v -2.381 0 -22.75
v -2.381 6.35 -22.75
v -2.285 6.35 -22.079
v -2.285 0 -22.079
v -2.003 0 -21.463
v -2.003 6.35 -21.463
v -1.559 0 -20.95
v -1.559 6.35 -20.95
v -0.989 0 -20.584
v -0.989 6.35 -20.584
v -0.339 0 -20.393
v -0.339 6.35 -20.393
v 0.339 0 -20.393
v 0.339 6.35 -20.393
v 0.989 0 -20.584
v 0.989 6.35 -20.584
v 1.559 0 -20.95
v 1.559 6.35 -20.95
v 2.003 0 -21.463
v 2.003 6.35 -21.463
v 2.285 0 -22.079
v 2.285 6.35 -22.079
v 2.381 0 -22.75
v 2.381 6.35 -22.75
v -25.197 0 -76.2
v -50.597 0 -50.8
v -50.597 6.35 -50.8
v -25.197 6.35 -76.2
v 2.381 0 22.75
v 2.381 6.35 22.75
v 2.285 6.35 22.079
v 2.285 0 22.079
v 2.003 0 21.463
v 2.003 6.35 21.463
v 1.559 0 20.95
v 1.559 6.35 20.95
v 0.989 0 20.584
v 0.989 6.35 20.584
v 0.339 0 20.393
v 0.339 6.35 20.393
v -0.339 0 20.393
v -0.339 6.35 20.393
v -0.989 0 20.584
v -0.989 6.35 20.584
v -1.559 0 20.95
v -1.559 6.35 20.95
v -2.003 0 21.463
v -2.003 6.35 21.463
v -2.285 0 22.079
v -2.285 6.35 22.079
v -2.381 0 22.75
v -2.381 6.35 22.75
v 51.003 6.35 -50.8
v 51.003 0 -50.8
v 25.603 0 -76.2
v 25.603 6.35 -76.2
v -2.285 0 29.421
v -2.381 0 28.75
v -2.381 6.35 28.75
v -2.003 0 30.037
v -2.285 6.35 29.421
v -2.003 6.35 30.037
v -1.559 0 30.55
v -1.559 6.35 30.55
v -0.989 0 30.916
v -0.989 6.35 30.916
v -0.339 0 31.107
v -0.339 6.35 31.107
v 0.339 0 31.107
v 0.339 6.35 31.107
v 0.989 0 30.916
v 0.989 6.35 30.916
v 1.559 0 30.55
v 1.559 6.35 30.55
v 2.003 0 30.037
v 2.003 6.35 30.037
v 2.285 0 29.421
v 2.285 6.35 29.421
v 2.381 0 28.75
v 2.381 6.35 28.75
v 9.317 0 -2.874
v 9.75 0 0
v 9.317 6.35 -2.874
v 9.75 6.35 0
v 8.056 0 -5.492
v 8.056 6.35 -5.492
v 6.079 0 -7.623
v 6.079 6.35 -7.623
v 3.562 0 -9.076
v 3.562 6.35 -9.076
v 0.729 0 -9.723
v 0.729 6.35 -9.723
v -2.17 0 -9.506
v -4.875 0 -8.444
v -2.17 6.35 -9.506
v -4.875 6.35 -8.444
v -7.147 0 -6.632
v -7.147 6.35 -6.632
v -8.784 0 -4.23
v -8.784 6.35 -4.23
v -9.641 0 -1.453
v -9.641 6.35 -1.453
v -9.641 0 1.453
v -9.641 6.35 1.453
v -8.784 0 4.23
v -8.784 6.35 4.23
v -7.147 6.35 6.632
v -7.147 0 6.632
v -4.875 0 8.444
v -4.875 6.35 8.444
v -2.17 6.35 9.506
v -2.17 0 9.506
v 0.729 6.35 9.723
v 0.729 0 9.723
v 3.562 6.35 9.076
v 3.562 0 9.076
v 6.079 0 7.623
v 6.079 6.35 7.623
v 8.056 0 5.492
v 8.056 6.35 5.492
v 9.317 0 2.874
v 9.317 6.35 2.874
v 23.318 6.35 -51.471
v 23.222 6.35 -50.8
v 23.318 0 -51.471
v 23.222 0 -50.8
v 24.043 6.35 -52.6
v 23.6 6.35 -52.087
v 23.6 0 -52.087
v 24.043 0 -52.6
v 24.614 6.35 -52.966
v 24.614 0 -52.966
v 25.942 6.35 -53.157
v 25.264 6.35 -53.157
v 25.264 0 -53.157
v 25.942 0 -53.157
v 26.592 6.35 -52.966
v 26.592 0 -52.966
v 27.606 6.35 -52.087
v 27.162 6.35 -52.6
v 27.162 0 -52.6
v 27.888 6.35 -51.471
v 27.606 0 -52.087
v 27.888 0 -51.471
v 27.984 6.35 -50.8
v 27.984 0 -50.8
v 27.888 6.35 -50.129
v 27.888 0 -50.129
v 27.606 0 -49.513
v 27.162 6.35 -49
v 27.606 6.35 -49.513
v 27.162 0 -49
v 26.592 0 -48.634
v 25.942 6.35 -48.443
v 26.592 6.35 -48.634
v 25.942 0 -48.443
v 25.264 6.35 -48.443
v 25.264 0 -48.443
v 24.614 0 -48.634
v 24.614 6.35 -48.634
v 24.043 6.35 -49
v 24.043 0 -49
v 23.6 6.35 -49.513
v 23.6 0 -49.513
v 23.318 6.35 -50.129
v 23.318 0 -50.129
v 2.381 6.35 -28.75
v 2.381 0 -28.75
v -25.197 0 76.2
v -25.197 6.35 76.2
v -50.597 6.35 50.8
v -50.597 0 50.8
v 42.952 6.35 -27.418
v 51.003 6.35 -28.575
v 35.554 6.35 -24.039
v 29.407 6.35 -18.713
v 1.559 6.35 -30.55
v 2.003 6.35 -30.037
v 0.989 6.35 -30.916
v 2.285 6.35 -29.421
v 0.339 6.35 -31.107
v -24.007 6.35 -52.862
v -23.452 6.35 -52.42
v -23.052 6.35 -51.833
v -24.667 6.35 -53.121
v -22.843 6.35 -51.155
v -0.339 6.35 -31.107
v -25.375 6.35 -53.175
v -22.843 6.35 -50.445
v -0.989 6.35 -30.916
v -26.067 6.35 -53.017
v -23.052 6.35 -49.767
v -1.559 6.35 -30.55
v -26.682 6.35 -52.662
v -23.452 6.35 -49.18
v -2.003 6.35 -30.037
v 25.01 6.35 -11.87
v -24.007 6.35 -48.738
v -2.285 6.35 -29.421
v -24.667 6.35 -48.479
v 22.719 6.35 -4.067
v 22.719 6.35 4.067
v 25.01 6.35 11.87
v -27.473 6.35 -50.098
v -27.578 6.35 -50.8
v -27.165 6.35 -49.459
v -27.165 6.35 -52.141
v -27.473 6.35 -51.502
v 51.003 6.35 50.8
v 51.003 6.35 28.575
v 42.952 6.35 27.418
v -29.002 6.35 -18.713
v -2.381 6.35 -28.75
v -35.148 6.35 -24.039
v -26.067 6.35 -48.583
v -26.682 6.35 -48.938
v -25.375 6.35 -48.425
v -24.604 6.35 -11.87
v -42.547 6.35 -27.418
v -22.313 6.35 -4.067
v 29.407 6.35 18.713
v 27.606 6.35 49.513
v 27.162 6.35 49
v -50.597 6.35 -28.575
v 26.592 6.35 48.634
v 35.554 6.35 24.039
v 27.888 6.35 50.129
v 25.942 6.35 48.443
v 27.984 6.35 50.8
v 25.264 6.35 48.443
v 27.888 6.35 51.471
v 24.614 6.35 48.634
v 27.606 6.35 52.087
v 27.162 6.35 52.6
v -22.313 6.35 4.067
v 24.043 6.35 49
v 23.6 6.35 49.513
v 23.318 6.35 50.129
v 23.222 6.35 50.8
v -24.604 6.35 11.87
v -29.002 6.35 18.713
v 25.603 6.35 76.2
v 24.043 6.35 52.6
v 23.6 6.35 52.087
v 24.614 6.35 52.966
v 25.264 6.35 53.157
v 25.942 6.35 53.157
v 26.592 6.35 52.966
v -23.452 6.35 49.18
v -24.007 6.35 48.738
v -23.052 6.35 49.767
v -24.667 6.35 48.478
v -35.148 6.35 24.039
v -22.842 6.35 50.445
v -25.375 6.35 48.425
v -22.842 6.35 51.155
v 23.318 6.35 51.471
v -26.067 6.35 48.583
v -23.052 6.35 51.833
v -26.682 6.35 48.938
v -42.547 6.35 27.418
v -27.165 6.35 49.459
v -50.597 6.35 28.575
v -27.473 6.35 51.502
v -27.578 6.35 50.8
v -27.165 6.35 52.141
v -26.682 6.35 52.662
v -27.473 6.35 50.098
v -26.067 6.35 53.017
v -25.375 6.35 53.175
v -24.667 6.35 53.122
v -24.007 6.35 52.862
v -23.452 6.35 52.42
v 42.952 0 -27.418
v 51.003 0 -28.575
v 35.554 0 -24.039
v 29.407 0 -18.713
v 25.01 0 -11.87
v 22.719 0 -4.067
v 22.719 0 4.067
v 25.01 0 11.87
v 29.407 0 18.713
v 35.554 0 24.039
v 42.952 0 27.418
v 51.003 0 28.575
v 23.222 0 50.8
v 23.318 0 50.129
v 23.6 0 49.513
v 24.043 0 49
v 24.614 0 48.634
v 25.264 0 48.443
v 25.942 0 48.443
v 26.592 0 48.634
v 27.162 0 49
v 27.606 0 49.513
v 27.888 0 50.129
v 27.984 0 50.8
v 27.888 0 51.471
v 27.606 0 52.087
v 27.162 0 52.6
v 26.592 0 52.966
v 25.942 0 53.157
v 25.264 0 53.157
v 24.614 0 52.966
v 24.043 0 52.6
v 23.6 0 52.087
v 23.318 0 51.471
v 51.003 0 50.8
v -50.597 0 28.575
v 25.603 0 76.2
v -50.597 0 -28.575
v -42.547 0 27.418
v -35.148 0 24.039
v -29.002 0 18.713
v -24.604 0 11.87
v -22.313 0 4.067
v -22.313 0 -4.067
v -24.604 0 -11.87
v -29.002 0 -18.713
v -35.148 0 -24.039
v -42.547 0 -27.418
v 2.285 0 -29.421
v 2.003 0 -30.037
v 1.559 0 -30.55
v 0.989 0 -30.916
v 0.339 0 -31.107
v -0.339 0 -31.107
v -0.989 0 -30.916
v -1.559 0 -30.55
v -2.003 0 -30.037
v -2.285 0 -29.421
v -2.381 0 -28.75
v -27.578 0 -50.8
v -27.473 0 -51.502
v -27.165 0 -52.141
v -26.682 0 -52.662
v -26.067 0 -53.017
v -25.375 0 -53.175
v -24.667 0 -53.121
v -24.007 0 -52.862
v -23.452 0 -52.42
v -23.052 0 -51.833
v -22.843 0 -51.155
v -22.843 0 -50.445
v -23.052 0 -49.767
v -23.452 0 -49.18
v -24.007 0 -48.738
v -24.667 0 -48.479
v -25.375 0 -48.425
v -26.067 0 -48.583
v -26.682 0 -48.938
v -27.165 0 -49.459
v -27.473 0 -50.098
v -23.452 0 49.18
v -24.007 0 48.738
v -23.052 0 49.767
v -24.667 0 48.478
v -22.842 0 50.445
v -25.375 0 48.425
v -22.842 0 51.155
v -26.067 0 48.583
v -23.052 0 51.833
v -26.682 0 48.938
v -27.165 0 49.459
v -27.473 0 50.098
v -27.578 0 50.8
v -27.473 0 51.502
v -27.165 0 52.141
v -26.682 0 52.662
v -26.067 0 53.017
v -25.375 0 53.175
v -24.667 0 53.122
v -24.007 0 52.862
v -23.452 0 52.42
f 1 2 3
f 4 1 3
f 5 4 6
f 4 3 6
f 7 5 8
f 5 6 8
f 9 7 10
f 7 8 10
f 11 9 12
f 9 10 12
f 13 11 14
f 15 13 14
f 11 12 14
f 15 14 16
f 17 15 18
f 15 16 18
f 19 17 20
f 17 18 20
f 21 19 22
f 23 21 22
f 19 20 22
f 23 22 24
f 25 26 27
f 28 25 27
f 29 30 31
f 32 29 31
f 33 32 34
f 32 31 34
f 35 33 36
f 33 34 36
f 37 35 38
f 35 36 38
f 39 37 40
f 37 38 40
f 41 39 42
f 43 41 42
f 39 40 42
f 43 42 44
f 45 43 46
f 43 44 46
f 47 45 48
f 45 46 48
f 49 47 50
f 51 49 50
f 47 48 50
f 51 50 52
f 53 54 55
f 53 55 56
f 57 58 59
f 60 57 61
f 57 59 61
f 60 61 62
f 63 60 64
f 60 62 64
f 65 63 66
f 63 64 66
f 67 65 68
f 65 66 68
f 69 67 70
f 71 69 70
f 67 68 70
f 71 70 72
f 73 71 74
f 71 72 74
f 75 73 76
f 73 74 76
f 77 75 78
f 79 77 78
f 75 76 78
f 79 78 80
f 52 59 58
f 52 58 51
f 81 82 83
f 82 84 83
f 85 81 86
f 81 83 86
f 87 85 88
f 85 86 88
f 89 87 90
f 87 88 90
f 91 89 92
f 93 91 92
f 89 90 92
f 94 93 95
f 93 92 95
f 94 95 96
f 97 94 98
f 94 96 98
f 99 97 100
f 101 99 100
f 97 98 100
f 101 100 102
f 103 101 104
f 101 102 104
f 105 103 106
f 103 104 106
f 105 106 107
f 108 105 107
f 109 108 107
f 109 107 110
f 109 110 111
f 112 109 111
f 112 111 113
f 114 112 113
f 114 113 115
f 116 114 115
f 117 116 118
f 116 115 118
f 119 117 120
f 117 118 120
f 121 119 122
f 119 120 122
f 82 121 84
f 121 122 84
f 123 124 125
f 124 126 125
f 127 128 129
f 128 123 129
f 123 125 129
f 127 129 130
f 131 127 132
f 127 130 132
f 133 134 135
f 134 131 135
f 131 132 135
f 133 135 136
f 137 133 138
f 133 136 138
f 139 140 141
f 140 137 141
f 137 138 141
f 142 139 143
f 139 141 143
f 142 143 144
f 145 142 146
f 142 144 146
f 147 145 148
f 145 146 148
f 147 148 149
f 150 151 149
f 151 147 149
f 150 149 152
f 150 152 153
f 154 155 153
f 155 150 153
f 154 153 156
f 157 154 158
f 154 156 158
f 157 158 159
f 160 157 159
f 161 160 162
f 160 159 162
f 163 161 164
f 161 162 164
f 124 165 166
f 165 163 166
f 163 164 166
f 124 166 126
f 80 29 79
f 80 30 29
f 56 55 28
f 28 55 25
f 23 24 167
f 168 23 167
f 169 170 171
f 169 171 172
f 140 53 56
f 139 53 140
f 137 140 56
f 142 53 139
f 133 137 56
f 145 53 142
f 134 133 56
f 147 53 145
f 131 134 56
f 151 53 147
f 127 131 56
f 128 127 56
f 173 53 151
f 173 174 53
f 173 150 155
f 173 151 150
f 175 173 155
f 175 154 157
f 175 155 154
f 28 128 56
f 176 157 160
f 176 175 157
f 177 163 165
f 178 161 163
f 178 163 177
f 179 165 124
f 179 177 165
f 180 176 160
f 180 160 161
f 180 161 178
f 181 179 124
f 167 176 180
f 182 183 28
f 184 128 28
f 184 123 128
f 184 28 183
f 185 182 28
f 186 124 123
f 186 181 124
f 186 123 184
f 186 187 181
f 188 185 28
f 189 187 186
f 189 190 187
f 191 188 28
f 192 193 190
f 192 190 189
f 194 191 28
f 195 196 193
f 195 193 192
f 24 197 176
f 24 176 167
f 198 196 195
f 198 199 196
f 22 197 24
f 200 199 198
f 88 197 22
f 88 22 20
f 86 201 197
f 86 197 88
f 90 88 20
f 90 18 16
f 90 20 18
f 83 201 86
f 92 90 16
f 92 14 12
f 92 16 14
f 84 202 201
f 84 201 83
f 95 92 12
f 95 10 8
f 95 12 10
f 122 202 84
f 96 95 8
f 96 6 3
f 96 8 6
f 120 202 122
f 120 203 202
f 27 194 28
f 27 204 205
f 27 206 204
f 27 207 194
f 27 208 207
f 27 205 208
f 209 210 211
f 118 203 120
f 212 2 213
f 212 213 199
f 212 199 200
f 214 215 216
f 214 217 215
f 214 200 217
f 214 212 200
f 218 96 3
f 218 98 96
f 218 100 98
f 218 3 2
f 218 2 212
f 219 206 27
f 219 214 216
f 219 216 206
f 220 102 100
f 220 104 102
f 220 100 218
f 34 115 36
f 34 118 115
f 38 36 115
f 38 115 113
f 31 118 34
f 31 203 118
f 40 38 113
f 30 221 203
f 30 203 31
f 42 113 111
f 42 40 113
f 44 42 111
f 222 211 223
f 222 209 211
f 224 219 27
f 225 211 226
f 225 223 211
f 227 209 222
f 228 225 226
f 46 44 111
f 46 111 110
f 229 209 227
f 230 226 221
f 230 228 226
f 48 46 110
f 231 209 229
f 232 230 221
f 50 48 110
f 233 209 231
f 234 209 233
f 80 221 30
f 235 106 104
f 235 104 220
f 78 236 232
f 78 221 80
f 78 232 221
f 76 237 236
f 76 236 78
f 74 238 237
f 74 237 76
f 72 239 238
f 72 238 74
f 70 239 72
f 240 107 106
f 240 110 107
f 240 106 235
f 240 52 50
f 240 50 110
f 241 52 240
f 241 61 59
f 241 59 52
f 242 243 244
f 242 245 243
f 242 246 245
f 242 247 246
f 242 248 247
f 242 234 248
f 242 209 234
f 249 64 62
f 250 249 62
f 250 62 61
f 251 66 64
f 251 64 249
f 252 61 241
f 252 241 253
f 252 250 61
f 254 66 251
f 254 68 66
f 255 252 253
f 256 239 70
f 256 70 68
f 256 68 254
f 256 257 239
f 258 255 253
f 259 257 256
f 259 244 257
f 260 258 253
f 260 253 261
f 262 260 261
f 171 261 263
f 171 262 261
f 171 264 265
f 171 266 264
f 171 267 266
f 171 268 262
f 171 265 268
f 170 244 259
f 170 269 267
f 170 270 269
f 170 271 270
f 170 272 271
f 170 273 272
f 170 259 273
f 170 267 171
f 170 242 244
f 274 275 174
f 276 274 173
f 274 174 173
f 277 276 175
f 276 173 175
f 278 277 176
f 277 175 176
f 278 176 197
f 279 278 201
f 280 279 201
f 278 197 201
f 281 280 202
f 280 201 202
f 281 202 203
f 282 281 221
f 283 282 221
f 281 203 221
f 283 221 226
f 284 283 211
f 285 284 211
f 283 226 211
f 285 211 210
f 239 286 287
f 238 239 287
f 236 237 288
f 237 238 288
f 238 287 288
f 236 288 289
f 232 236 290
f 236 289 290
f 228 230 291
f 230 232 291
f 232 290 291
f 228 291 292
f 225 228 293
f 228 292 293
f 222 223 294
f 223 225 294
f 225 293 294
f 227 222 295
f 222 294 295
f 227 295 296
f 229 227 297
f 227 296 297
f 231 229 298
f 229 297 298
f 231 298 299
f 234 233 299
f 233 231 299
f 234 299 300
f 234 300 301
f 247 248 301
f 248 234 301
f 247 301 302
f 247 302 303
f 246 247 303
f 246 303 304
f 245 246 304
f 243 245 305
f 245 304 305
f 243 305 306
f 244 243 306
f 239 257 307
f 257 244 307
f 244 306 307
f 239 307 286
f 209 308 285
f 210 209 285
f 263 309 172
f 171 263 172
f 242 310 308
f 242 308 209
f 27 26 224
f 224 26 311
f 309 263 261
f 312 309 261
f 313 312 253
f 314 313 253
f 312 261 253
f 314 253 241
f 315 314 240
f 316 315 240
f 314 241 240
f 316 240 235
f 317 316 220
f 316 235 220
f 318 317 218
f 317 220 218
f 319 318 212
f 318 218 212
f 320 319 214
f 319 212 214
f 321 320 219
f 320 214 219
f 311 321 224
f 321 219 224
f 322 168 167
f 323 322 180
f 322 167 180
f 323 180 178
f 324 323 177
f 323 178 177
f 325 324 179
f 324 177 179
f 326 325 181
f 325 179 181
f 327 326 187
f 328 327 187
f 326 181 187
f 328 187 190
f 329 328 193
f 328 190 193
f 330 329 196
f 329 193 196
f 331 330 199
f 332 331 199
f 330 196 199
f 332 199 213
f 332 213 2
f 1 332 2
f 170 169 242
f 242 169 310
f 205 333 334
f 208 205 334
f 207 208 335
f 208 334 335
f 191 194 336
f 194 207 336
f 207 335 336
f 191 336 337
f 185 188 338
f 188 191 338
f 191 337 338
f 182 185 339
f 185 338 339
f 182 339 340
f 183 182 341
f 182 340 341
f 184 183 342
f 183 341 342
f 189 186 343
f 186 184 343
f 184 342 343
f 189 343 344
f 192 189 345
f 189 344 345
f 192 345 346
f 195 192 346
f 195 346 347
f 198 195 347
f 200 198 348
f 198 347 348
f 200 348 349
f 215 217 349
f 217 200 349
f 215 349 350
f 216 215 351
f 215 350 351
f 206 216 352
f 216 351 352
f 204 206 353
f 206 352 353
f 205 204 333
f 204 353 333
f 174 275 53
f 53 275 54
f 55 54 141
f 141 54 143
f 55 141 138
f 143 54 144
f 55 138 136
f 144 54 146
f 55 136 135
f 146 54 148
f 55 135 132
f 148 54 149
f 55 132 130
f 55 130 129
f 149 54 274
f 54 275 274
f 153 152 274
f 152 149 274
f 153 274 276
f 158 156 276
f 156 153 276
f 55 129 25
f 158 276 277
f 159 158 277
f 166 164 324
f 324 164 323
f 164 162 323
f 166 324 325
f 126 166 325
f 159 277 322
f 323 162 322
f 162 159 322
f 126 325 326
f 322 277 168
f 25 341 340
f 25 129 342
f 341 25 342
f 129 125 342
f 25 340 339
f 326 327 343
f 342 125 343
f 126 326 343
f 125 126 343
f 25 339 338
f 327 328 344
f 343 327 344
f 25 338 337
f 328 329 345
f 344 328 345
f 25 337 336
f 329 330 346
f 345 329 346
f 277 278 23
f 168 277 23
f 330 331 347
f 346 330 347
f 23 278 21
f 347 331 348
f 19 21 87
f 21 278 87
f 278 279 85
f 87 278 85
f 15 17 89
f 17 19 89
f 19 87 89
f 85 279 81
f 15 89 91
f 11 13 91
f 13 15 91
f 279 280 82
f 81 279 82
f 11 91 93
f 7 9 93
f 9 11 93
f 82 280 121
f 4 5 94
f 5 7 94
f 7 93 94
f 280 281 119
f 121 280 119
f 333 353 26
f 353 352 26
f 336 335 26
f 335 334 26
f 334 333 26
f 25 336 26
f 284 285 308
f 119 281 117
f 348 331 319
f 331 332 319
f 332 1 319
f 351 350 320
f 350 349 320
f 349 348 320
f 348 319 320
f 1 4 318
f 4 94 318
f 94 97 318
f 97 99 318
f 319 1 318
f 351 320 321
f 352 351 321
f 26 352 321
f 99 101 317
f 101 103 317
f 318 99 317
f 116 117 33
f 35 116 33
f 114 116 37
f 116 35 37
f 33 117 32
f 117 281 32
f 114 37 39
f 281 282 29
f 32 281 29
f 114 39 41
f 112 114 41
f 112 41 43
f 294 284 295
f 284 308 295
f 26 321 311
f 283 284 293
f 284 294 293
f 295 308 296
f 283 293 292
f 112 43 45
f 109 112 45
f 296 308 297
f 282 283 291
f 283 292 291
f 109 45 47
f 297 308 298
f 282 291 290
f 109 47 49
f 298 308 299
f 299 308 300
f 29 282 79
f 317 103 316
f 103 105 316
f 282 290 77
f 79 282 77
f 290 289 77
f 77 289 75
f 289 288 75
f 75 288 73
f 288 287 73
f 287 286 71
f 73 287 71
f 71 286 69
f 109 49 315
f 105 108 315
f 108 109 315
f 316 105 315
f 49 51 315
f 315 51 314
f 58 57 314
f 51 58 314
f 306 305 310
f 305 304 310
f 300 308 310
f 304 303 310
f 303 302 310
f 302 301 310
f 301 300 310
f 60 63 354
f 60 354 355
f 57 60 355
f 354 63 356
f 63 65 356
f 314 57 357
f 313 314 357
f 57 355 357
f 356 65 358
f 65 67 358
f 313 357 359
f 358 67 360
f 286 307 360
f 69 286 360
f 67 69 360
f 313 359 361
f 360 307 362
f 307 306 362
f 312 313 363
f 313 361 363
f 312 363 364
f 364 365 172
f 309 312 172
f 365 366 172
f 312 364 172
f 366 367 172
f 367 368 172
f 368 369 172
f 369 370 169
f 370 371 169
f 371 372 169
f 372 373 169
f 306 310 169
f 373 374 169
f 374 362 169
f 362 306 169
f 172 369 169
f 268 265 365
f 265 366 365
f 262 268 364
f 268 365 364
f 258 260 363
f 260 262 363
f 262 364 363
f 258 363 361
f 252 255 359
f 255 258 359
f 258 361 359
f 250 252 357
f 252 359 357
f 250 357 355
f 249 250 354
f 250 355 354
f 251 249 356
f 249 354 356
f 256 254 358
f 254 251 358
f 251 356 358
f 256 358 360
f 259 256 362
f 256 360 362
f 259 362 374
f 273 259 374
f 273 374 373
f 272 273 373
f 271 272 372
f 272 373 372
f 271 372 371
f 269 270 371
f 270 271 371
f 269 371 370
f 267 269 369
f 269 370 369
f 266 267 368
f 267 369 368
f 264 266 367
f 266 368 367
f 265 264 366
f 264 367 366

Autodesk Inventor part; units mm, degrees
ref_plane "YZ Plane" through (0, 0, 0) normal (1, 0, 0) x (0, 1, 0)
ref_plane "XZ Plane" through (0, 0, 0) normal (0, 1, 0) x (-1, 0, 0)
ref_plane "XY Plane" through (0, 0, 0) normal (0, 0, 1) x (1, 0, 0)
sketch "Sketch1" plane through (0, 0, 0) normal (0, 1, 0) x (-1, 0, 0)
  line L0 (-0.2028, 19.4) -> (-0.2028, 32.1) construction
  line L1 (-2.584, 19.4) -> (-2.584, 32.1)
  line L2 (2.1785, 32.1) -> (2.1785, 19.4)
  arc A0 (-2.584, 19.4) -> (2.1785, 19.4) centre (-0.2028, 19.4) ccw
  arc A1 (2.1785, 32.1) -> (-2.584, 32.1) centre (-0.2028, 32.1) ccw
  line L3 (-0.2028, -19.4) -> (-0.2028, -32.1) construction
  line L4 (-2.584, -19.4) -> (-2.584, -32.1)
  line L5 (2.1785, -32.1) -> (2.1785, -19.4)
  arc A2 (2.1785, -19.4) -> (-2.584, -19.4) centre (-0.2028, -19.4) ccw
  arc A3 (-2.584, -32.1) -> (2.1785, -32.1) centre (-0.2028, -32.1) ccw
  line L6 (-51.0028, -76.2) -> (50.5972, -76.2)
  line L7 (50.5972, -76.2) -> (50.5972, 76.2)
  line L8 (50.5972, 76.2) -> (-51.0028, 76.2)
  line L9 (-51.0028, 76.2) -> (-51.0028, -76.2)
  line L10 (-51.0028, -76.2) -> (50.5972, 76.2) construction
  line L11 (50.5972, -76.2) -> (-51.0028, 76.2) construction
  line L12 (50.5972, 76.2) -> (50.5972, 50.8)
  line L13 (50.5972, 50.8) -> (25.1972, 50.8)
  line L14 (-51.0028, 76.2) -> (-51.0028, 50.8)
  line L15 (-51.0028, 50.8) -> (-25.6028, 50.8)
  line L16 (50.5972, -76.2) -> (50.5972, -50.8)
  line L17 (50.5972, -50.8) -> (25.1972, -50.8)
  line L18 (-51.0028, -76.2) -> (-51.0028, -50.8)
  line L19 (-51.0028, -50.8) -> (-25.6028, -50.8)
  circle A4 centre (25.1972, 50.8) radius 2.3813
  circle A5 centre (25.1972, -50.8) radius 2.3812
  circle A6 centre (-25.6028, 50.8) radius 2.3812
  circle A7 centre (-25.6028, -50.8) radius 2.3812
  arc A8 (-2.584, 31.6606) -> (-2.584, -31.6606) centre (-0.2028, 0) ccw
  arc A9 (2.1785, -31.6606) -> (2.1785, 31.6606) centre (-0.2028, 0) ccw
  point P0 (0, 0)
  dimension "d7" = 101.6
  dimension "d8" = 152.4
  dimension "d9" = 25.4
  dimension "d10" = 25.4
  dimension "d11" = 25.4
  dimension "d12" = 25.4
  dimension "d13" = 25.4
  dimension "d14" = 25.4
  dimension "d15" = 25.4
  dimension "d16" = 25.4
  dimension "d17" = 4.7625
  dimension "d18" = 4.7625
  dimension "d19" = 4.7625
  dimension "d20" = 4.7625
extrude "Extrusion1" add sketch "Sketch1" along normal blind 6.35 contours A0 L2 A9 L5 A2 L4 A8 L1 | L9 L8 L7 L6
sketch "Sketch2" plane through (0, 6.35, 0) normal (0, 1, 0) x (1, 0, 0)
  circle A0 centre (0, 0) radius 9.75
  dimension "d23" = 19.5
extrude "Extrusion2" cut sketch "Sketch2" against normal blind 6.35
sketch "Sketch3" plane through (0, 6.35, 0) normal (0, 1, 0) x (1, 0, 0)
  line L0 (-6.6401, -37.7246) -> (10.2278, -37.7246)
  line L1 (10.2278, -37.7246) -> (10.2278, -15.7747)
  line L2 (10.2278, -15.7747) -> (-6.6401, -15.7747)
  line L3 (-6.6401, -15.7747) -> (-6.6401, -37.7246)
  line L4 (-9.2351, 15.4742) -> (5.254, 15.4742)
  line L5 (5.254, 15.4742) -> (5.254, 41.8573)
  line L6 (5.254, 41.8573) -> (-9.2351, 41.8573)
  line L7 (-9.2351, 41.8573) -> (-9.2351, 15.4742)
  point P0 (0, 0)
extrude "Extrusion3" add sketch "Sketch3" against normal blind 6.35
sketch "Sketch4" plane through (0, 6.35, 0) normal (0, 1, 0) x (1, 0, 0)
  circle A0 centre (0, 0) radius 31.75
  line L0 (0, -31.75) -> (0, -25.75)
  line L1 (0, 31.75) -> (0, 25.75)
  circle A1 centre (0, -25.75) radius 2.3812
  circle A2 centre (0, 25.75) radius 2.3813
  line L2 (0, -22.75) -> (0, -28.75) construction
  line L3 (2.3812, -22.75) -> (2.3812, -28.75)
  line L4 (-2.3812, -28.75) -> (-2.3812, -22.75)
  arc A3 (2.3812, -22.75) -> (-2.3812, -22.75) centre (0, -22.75) ccw
  arc A4 (-2.3812, -28.75) -> (2.3812, -28.75) centre (0, -28.75) ccw
  line L5 (0, 22.75) -> (0, 28.75) construction
  line L6 (2.3813, 22.75) -> (2.3813, 28.75)
  line L7 (-2.3813, 28.75) -> (-2.3813, 22.75)
  arc A5 (-2.3813, 22.75) -> (2.3813, 22.75) centre (0, 22.75) ccw
  arc A6 (2.3813, 28.75) -> (-2.3813, 28.75) centre (0, 28.75) ccw
  dimension "d28" = 63.5
  dimension "d29" = 6
  dimension "d30" = 6
  dimension "d31" = 4.7625
  dimension "d32" = 4.7625
extrude "Extrusion4" cut sketch "Sketch4" against normal blind 6.35 contours A6 L6 A2 L1 | L1 A2 L7 A6 | A4 L4 A1 L0 | L0 A1 L3 A4 | A2 | A1 | L6 A5 L7 A2 | L4 A3 L3 A1
chamfer "Chamfer1" distance 25.4 angle 45 4 edges at (-50.5972, 3.175, 76.2) (51.0028, 3.175, 76.2) (-50.5972, 3.175, -76.2) (51.0028, 3.175, -76.2)
sketch "Sketch5" plane through (0, 6.35, 0) normal (0, 1, 0) x (1, 0, 0)
  line L0 (-50.5972, 50.8) -> (-50.5972, -50.8) projected
  circle A0 centre (-50.5972, 0) radius 28.575
  line L1 (51.0028, -50.8) -> (51.0028, 50.8) projected
  circle A1 centre (51.0028, 0) radius 28.575
  point P0 (0, 0)
  dimension "d38" = 57.15
  dimension "d39" = 57.15
extrude "Extrusion5" cut sketch "Sketch5" against normal blind 6.35
properties part number "motor mount plate"
